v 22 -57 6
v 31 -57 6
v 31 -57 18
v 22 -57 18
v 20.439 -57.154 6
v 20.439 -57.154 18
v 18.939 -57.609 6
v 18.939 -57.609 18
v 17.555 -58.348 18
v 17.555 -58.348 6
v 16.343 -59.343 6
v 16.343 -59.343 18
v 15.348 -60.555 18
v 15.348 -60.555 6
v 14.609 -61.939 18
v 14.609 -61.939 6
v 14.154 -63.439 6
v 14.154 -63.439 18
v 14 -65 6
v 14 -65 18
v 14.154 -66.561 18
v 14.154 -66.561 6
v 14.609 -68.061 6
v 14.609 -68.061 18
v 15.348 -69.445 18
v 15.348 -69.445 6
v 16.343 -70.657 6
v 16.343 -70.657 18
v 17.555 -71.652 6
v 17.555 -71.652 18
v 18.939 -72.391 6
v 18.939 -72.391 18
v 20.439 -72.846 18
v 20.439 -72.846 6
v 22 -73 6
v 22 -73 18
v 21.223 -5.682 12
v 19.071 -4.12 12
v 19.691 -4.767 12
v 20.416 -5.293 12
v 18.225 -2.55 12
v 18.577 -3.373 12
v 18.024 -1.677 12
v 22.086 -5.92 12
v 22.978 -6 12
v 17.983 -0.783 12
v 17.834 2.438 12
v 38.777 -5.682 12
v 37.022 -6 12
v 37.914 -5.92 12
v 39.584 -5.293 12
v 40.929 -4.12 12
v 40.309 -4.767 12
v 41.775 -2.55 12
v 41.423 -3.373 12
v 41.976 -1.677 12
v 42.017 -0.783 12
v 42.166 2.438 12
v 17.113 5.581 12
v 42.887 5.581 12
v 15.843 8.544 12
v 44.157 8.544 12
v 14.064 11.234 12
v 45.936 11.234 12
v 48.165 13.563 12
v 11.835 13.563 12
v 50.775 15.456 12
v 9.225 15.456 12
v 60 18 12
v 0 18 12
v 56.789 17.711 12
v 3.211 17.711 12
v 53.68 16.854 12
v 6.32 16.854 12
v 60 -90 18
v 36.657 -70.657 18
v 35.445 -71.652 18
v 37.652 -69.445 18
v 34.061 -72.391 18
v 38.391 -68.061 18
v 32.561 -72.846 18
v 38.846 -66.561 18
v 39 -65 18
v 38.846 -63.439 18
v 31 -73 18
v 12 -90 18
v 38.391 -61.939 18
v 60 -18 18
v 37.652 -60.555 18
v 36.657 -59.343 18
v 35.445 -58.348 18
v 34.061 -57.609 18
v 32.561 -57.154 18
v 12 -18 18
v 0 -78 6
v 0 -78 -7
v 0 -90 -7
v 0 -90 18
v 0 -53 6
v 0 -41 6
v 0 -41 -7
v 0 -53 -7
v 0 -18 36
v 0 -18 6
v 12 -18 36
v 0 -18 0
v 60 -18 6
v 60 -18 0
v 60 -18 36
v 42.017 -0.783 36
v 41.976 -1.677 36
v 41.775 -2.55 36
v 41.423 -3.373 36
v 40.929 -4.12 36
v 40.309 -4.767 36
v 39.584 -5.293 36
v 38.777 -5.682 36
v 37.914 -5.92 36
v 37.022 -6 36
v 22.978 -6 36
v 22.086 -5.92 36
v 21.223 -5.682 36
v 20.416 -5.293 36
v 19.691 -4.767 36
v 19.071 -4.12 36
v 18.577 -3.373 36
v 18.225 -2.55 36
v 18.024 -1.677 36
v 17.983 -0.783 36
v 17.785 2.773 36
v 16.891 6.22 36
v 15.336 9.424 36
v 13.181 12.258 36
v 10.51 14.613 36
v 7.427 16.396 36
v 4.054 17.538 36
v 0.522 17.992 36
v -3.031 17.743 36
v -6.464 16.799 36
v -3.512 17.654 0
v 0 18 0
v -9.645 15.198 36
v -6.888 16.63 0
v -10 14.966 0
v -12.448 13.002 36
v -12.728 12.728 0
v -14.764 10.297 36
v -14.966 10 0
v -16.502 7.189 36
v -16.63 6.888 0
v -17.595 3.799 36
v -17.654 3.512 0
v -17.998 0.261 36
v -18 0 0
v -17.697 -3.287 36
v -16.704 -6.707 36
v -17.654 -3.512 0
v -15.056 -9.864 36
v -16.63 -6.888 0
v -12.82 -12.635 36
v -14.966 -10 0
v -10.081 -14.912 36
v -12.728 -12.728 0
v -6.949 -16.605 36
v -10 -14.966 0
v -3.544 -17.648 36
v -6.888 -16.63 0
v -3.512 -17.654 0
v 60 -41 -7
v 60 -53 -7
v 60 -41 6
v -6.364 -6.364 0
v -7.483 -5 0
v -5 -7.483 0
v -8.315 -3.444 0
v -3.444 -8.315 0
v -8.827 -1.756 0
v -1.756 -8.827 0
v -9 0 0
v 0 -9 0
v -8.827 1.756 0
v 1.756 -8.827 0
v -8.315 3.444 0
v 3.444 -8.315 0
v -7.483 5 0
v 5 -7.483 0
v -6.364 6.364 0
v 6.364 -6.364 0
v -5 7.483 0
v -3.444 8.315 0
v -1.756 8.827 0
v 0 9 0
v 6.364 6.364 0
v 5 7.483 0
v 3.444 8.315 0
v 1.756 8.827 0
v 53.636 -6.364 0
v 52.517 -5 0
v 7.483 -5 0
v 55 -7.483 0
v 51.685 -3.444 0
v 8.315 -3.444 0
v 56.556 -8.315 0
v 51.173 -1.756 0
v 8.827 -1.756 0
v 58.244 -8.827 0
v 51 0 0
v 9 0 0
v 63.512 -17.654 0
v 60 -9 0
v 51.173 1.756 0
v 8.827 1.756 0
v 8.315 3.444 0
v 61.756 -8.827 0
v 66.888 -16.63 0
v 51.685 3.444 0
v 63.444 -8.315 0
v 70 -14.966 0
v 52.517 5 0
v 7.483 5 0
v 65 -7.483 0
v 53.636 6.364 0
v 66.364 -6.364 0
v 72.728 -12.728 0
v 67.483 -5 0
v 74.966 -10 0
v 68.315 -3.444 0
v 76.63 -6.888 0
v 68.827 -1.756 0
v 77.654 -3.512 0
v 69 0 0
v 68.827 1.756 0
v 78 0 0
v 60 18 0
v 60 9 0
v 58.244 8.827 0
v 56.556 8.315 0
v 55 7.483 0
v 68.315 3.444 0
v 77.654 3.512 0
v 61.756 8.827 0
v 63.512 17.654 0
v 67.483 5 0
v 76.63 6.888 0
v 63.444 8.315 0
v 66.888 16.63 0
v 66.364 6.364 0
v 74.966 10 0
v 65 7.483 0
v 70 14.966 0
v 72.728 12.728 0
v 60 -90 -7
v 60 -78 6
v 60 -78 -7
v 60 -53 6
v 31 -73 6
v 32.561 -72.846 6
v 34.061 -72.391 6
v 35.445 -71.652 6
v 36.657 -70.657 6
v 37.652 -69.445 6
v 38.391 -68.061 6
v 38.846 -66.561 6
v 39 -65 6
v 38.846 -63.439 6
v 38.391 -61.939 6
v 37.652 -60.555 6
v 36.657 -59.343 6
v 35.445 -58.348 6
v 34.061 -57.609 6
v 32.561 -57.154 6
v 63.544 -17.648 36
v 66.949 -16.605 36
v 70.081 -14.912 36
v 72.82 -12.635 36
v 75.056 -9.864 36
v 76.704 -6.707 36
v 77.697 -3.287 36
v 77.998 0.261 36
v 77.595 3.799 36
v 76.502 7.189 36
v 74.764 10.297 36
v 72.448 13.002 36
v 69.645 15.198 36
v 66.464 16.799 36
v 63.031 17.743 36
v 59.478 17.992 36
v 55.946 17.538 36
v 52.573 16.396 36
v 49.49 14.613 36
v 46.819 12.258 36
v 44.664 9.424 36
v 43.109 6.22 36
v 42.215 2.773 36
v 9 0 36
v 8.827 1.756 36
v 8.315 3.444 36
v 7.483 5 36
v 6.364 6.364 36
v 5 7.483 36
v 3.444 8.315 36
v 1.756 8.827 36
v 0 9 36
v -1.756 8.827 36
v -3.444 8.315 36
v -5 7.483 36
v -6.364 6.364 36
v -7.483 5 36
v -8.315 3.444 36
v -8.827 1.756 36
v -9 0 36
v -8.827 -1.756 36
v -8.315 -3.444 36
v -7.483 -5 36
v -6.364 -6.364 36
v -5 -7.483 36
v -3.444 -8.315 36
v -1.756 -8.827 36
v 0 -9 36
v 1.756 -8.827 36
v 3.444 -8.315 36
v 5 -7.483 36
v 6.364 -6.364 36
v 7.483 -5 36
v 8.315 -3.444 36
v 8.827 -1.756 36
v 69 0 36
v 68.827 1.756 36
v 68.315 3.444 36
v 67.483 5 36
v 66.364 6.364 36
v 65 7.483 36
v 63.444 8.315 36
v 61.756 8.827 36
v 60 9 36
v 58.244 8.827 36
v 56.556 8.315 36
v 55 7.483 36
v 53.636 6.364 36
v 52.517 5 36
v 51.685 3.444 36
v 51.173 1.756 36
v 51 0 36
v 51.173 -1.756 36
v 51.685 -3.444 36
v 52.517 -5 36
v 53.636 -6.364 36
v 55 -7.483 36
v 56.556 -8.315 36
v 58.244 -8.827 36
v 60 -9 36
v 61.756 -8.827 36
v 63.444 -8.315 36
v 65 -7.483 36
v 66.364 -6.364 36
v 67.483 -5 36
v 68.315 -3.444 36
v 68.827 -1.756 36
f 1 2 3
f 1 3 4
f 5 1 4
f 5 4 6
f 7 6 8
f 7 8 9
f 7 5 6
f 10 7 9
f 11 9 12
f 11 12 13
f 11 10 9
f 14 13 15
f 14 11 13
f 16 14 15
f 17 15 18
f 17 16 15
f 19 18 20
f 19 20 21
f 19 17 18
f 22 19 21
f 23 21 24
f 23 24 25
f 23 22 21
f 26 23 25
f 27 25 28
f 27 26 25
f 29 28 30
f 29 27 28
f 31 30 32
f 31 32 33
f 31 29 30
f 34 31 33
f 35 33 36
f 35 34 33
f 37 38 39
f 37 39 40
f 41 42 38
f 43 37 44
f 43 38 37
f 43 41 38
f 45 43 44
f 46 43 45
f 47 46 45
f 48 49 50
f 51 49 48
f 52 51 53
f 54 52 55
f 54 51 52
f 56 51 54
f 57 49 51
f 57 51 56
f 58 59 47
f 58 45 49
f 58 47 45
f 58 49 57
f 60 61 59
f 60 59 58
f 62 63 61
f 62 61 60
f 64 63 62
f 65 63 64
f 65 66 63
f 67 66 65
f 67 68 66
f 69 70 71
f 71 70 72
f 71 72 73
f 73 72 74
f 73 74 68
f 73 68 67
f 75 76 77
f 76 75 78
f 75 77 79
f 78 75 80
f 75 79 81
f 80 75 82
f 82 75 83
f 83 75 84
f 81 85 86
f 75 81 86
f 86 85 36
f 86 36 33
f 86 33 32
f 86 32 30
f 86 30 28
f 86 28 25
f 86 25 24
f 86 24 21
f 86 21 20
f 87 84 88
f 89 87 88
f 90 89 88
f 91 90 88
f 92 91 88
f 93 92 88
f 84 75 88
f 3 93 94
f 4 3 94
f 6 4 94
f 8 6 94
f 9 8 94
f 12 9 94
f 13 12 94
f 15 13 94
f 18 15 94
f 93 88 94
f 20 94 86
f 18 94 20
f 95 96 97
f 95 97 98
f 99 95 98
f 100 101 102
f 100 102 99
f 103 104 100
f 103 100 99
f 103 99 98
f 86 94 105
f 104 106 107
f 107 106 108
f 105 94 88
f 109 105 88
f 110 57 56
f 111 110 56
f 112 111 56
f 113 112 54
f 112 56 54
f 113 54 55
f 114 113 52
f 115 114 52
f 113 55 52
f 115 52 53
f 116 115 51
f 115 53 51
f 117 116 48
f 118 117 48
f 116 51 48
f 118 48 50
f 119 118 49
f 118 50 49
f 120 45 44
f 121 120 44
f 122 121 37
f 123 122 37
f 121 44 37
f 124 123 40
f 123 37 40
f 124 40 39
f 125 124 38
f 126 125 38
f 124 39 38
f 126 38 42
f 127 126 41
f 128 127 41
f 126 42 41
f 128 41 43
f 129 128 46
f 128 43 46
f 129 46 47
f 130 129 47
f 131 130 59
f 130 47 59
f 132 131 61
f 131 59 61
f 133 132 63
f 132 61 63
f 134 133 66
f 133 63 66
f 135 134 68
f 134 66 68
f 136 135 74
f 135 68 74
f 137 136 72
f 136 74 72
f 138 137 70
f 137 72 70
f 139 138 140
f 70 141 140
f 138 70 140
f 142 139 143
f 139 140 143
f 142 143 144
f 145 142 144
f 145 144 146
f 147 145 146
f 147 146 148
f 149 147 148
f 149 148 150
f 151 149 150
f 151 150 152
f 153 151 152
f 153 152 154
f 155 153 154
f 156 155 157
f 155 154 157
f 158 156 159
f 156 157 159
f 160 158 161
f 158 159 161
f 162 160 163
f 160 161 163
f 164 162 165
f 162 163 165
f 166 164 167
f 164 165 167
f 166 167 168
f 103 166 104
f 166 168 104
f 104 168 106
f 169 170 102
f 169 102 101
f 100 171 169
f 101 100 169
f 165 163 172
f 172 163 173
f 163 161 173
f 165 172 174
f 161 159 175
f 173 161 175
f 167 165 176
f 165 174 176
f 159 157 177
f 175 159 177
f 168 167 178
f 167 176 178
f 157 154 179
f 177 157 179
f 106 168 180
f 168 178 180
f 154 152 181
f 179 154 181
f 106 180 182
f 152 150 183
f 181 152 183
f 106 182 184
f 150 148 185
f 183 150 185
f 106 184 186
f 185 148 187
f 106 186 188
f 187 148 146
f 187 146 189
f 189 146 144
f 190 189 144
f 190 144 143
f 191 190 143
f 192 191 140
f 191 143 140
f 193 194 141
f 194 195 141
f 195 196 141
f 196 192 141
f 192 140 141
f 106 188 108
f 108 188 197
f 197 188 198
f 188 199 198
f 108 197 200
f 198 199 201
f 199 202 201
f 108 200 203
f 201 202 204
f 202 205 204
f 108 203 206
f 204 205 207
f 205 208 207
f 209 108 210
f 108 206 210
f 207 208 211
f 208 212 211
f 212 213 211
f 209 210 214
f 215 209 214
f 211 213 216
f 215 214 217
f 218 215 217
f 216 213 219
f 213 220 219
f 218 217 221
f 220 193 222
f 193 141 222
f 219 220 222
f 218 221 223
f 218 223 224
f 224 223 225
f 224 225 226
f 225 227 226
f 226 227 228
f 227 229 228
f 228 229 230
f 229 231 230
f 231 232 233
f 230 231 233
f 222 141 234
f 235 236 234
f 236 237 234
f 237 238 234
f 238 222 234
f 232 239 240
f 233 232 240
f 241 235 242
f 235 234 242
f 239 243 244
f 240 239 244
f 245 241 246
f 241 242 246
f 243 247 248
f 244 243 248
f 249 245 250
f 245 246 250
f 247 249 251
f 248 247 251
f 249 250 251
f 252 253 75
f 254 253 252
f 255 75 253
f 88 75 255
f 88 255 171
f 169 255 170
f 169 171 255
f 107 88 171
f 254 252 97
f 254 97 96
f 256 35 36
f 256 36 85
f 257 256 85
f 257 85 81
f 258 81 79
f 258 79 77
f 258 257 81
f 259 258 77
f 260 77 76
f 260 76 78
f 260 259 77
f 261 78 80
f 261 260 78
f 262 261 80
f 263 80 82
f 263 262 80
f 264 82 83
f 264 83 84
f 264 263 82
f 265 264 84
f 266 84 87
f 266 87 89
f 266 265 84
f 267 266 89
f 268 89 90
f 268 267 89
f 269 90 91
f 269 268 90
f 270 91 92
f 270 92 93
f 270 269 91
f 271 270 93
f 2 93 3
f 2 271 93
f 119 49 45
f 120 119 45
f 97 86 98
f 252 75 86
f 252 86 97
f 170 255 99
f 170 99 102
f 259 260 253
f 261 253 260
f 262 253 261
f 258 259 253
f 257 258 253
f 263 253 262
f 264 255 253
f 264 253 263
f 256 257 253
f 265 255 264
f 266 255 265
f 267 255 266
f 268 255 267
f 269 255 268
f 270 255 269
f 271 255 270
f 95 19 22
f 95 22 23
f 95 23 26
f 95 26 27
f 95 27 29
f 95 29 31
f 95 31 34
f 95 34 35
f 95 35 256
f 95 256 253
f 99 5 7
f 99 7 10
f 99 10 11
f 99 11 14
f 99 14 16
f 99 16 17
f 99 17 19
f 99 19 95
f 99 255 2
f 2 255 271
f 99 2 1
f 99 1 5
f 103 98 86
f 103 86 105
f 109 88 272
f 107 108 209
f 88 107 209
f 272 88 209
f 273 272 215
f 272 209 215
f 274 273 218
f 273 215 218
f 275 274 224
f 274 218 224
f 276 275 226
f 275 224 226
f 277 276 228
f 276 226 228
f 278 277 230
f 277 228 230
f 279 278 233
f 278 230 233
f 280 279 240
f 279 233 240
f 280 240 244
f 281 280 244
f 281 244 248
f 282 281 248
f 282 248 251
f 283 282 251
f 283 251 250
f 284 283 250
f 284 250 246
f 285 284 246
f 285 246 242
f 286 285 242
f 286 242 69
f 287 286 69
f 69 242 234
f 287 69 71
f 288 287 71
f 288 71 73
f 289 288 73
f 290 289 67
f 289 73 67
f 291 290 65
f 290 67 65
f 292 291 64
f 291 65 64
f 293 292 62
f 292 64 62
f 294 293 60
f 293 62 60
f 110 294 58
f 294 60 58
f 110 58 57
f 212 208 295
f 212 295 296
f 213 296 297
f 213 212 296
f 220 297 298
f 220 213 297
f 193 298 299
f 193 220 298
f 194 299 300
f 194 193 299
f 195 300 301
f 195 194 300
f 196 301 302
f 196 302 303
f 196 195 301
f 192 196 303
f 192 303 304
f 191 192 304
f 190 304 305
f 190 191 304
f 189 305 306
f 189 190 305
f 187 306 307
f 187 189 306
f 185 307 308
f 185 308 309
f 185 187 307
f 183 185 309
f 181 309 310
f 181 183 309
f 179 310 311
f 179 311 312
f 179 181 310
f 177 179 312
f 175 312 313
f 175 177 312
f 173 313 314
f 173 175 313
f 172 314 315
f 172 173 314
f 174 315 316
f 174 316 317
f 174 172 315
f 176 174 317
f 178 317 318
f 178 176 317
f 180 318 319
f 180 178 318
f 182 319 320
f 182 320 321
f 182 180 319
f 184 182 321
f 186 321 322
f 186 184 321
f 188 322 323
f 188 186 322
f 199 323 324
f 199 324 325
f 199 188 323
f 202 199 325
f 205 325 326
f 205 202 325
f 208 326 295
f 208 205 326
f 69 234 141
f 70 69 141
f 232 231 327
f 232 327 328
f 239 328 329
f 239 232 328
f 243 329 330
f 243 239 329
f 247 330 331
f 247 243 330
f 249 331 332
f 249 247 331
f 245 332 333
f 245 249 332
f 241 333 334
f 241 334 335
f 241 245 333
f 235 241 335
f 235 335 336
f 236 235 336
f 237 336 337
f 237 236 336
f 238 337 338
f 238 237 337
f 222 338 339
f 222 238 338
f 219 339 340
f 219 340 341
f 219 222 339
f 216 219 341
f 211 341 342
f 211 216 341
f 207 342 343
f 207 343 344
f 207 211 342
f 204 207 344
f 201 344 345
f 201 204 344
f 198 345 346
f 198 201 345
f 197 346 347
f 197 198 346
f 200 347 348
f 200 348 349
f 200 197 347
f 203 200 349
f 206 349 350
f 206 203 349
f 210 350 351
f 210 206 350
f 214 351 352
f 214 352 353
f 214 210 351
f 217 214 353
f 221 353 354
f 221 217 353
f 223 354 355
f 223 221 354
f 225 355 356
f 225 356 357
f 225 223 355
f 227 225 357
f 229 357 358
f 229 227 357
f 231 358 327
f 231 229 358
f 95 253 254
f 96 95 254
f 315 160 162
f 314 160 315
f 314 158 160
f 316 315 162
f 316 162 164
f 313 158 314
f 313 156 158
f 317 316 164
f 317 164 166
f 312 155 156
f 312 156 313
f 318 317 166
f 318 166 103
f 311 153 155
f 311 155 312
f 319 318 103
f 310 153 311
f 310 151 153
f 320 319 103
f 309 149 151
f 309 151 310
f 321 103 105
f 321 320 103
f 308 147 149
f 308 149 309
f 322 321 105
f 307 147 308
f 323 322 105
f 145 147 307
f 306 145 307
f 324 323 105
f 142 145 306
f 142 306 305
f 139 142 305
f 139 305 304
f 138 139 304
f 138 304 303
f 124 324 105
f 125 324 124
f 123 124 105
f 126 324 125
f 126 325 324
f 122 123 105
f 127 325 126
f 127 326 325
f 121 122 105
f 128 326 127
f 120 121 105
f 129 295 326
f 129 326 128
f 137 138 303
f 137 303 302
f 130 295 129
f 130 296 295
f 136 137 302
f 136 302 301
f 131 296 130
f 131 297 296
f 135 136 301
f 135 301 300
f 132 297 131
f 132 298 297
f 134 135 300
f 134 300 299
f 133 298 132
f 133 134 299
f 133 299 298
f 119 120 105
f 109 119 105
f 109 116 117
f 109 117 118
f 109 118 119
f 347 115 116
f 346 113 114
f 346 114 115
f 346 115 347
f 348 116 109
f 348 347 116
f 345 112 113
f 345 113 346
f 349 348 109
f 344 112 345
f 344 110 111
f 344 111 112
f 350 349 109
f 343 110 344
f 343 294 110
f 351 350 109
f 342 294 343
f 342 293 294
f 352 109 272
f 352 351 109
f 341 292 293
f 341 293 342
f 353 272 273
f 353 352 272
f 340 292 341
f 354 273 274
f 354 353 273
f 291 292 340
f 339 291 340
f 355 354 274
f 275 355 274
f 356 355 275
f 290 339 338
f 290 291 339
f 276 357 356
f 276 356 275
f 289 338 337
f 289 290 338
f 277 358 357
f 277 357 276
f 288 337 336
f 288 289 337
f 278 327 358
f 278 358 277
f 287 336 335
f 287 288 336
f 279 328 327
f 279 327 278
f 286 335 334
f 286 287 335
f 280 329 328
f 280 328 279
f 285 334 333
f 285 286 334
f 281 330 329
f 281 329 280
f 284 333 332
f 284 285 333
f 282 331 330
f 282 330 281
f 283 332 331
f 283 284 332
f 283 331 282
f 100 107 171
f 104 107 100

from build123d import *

# Parameters (mm, degrees)
SKETCH1_R           = 9
BOSS_EXTRUDE1_DEPTH = 36
BOSS_EXTRUDE2_DEPTH = 12
SKETCH3_W           = 60
SKETCH3_H           = 72
BOSS_EXTRUDE3_DEPTH = 12
SKETCH4_W           = 13
SKETCH4_H           = 12
BOSS_EXTRUDE4_DEPTH = 60
BOSS_EXTRUDE5_DEPTH = 12


with BuildPart() as part:
    # Sketch1 → Boss-Extrude1 (new body)
    with BuildSketch(Plane.XY):
        with BuildLine():
            Line((0, -18), (60, -18))
            ThreePointArc((60, -18), (72.448153347, 13.001672133), (42.01702128, -0.782608696))
            ThreePointArc((42.01702128, -0.782608696), (40.633325006, -4.457820374), (37.021749414, -6))
            Line((37.021749414, -6), (22.978250586, -6))
            ThreePointArc((22.978250586, -6), (19.366674994, -4.457820374), (17.98297872, -0.782608696))
            ThreePointArc((17.98297872, -0.782608696), (-12.448153347, 13.001672133), (0, -18))
        make_face()
        Circle(SKETCH1_R, mode=Mode.SUBTRACT)
        with Locations((60, 0)):
            Circle(SKETCH1_R, mode=Mode.SUBTRACT)
    extrude(amount=BOSS_EXTRUDE1_DEPTH)

    # Sketch2 → Boss-Extrude2 (add)
    with BuildSketch(Plane(origin=(0, 0, 0), x_dir=(-1, 0, 0), z_dir=(0, 0, -1))):
        with BuildLine():
            Line((-60, 18), (0, 18))
            ThreePointArc((0, 18), (-13.001672133, 12.448153347), (-17.98297872, -0.782608696))
            ThreePointArc((-17.98297872, -0.782608696), (-19.366674994, -4.457820374), (-22.978250586, -6))
            Line((-22.978250586, -6), (-37.021749414, -6))
            ThreePointArc((-37.021749414, -6), (-40.633325006, -4.457820374), (-42.01702128, -0.782608696))
            ThreePointArc((-42.01702128, -0.782608696), (-46.998327867, 12.448153347), (-60, 18))
        make_face()
    extrude(amount=-BOSS_EXTRUDE2_DEPTH)

    # Sketch3 → Boss-Extrude3 (add)
    with BuildSketch(Plane(origin=(0, 0, 6), x_dir=(-1, 0, 0), z_dir=(0, 0, -1))):
        with Locations((-30, -54)):
            Rectangle(SKETCH3_W, SKETCH3_H)
        with BuildLine():
            Line((-31, -57), (-22, -57))
            ThreePointArc((-22, -57), (-14, -65), (-22, -73))
            Line((-22, -73), (-31, -73))
            ThreePointArc((-31, -73), (-39, -65), (-31, -57))
        make_face(mode=Mode.SUBTRACT)
    extrude(amount=-BOSS_EXTRUDE3_DEPTH)

    # Sketch4 → Boss-Extrude4 (add)
    with BuildSketch(Plane(origin=(60, 0, 0), x_dir=(0, 0, -1), z_dir=(1, 0, 0))):
        with Locations((0.5, -47)):
            Rectangle(SKETCH4_W, SKETCH4_H)
        with Locations((0.5, -84)):
            Rectangle(SKETCH4_W, SKETCH4_H)
    extrude(amount=-BOSS_EXTRUDE4_DEPTH)

    # Sketch5 → Boss-Extrude5 (add)
    with BuildSketch(Plane.ZY):
        Polygon((18, -90), (36, -18), (18, -18), align=None)
    extrude(amount=-BOSS_EXTRUDE5_DEPTH)


solid = part.part
